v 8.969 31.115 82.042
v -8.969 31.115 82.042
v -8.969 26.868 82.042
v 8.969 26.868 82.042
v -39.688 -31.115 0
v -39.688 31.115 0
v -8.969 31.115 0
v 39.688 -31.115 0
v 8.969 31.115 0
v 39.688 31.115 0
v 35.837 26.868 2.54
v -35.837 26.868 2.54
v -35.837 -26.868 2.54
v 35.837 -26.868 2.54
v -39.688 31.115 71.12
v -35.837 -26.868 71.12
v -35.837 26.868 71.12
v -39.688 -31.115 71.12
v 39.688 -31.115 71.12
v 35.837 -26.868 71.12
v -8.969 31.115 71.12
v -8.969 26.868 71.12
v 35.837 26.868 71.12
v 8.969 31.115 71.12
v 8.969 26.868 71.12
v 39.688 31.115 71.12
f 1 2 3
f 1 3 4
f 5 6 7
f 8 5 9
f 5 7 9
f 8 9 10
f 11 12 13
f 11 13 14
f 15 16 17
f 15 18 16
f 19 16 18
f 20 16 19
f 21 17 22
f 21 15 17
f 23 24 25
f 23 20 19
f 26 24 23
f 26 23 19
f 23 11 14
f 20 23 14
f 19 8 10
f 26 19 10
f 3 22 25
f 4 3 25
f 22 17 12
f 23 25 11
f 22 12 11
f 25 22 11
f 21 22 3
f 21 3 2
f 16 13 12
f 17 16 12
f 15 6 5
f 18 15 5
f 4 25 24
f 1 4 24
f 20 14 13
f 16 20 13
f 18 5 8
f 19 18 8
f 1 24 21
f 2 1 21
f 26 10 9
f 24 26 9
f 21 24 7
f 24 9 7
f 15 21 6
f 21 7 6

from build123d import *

# Parameters (mm, degrees)
F1_DEPTH = 71.12
F2_DEPTH = 2.54
F0_W     = 8.9689344168
F0_H     = 4.2472973967
F3_DEPTH = 82.042


with BuildPart() as f1:
    # F0 (on Top) → F1 (new body)
    with BuildSketch(Plane.XY):
        Polygon((39.6875, -31.115), (39.6875, 31.115), (8.9689344168, 31.115), (8.9689344168, 26.8677026033), (35.836905241, 26.8677026033), (35.836905241, -26.8677026033), (0, -26.8677026033), (0, -31.115), align=None)
        Polygon((-39.6875, -31.115), (0, -31.115), (0, -26.8677026033), (-35.836905241, -26.8677026033), (-35.836905241, 26.8677026033), (-8.9689344168, 26.8677026033), (-8.9689344168, 31.115), (-39.6875, 31.115), align=None)
    extrude(amount=F1_DEPTH)

    # F0 (on Top) → F2 (join)
    with BuildSketch(Plane.XY):
        Polygon((35.836905241, 26.8677026033), (8.9689344168, 26.8677026033), (0, 26.8677026033), (0, -26.8677026033), (35.836905241, -26.8677026033), align=None)
        Polygon((0, -26.8677026033), (0, 26.8677026033), (-8.9689344168, 26.8677026033), (-35.836905241, 26.8677026033), (-35.836905241, -26.8677026033), align=None)
    extrude(amount=F2_DEPTH)

    # F0 (on Top) → F3 (join)
    with BuildSketch(Plane.XY):
        with Locations((-4.4844672084, 28.9913513017)):
            Rectangle(F0_W, F0_H)
        with Locations((4.4844672084, 28.9913513017)):
            Rectangle(F0_W, F0_H)
    extrude(amount=F3_DEPTH)


solid = f1.part
